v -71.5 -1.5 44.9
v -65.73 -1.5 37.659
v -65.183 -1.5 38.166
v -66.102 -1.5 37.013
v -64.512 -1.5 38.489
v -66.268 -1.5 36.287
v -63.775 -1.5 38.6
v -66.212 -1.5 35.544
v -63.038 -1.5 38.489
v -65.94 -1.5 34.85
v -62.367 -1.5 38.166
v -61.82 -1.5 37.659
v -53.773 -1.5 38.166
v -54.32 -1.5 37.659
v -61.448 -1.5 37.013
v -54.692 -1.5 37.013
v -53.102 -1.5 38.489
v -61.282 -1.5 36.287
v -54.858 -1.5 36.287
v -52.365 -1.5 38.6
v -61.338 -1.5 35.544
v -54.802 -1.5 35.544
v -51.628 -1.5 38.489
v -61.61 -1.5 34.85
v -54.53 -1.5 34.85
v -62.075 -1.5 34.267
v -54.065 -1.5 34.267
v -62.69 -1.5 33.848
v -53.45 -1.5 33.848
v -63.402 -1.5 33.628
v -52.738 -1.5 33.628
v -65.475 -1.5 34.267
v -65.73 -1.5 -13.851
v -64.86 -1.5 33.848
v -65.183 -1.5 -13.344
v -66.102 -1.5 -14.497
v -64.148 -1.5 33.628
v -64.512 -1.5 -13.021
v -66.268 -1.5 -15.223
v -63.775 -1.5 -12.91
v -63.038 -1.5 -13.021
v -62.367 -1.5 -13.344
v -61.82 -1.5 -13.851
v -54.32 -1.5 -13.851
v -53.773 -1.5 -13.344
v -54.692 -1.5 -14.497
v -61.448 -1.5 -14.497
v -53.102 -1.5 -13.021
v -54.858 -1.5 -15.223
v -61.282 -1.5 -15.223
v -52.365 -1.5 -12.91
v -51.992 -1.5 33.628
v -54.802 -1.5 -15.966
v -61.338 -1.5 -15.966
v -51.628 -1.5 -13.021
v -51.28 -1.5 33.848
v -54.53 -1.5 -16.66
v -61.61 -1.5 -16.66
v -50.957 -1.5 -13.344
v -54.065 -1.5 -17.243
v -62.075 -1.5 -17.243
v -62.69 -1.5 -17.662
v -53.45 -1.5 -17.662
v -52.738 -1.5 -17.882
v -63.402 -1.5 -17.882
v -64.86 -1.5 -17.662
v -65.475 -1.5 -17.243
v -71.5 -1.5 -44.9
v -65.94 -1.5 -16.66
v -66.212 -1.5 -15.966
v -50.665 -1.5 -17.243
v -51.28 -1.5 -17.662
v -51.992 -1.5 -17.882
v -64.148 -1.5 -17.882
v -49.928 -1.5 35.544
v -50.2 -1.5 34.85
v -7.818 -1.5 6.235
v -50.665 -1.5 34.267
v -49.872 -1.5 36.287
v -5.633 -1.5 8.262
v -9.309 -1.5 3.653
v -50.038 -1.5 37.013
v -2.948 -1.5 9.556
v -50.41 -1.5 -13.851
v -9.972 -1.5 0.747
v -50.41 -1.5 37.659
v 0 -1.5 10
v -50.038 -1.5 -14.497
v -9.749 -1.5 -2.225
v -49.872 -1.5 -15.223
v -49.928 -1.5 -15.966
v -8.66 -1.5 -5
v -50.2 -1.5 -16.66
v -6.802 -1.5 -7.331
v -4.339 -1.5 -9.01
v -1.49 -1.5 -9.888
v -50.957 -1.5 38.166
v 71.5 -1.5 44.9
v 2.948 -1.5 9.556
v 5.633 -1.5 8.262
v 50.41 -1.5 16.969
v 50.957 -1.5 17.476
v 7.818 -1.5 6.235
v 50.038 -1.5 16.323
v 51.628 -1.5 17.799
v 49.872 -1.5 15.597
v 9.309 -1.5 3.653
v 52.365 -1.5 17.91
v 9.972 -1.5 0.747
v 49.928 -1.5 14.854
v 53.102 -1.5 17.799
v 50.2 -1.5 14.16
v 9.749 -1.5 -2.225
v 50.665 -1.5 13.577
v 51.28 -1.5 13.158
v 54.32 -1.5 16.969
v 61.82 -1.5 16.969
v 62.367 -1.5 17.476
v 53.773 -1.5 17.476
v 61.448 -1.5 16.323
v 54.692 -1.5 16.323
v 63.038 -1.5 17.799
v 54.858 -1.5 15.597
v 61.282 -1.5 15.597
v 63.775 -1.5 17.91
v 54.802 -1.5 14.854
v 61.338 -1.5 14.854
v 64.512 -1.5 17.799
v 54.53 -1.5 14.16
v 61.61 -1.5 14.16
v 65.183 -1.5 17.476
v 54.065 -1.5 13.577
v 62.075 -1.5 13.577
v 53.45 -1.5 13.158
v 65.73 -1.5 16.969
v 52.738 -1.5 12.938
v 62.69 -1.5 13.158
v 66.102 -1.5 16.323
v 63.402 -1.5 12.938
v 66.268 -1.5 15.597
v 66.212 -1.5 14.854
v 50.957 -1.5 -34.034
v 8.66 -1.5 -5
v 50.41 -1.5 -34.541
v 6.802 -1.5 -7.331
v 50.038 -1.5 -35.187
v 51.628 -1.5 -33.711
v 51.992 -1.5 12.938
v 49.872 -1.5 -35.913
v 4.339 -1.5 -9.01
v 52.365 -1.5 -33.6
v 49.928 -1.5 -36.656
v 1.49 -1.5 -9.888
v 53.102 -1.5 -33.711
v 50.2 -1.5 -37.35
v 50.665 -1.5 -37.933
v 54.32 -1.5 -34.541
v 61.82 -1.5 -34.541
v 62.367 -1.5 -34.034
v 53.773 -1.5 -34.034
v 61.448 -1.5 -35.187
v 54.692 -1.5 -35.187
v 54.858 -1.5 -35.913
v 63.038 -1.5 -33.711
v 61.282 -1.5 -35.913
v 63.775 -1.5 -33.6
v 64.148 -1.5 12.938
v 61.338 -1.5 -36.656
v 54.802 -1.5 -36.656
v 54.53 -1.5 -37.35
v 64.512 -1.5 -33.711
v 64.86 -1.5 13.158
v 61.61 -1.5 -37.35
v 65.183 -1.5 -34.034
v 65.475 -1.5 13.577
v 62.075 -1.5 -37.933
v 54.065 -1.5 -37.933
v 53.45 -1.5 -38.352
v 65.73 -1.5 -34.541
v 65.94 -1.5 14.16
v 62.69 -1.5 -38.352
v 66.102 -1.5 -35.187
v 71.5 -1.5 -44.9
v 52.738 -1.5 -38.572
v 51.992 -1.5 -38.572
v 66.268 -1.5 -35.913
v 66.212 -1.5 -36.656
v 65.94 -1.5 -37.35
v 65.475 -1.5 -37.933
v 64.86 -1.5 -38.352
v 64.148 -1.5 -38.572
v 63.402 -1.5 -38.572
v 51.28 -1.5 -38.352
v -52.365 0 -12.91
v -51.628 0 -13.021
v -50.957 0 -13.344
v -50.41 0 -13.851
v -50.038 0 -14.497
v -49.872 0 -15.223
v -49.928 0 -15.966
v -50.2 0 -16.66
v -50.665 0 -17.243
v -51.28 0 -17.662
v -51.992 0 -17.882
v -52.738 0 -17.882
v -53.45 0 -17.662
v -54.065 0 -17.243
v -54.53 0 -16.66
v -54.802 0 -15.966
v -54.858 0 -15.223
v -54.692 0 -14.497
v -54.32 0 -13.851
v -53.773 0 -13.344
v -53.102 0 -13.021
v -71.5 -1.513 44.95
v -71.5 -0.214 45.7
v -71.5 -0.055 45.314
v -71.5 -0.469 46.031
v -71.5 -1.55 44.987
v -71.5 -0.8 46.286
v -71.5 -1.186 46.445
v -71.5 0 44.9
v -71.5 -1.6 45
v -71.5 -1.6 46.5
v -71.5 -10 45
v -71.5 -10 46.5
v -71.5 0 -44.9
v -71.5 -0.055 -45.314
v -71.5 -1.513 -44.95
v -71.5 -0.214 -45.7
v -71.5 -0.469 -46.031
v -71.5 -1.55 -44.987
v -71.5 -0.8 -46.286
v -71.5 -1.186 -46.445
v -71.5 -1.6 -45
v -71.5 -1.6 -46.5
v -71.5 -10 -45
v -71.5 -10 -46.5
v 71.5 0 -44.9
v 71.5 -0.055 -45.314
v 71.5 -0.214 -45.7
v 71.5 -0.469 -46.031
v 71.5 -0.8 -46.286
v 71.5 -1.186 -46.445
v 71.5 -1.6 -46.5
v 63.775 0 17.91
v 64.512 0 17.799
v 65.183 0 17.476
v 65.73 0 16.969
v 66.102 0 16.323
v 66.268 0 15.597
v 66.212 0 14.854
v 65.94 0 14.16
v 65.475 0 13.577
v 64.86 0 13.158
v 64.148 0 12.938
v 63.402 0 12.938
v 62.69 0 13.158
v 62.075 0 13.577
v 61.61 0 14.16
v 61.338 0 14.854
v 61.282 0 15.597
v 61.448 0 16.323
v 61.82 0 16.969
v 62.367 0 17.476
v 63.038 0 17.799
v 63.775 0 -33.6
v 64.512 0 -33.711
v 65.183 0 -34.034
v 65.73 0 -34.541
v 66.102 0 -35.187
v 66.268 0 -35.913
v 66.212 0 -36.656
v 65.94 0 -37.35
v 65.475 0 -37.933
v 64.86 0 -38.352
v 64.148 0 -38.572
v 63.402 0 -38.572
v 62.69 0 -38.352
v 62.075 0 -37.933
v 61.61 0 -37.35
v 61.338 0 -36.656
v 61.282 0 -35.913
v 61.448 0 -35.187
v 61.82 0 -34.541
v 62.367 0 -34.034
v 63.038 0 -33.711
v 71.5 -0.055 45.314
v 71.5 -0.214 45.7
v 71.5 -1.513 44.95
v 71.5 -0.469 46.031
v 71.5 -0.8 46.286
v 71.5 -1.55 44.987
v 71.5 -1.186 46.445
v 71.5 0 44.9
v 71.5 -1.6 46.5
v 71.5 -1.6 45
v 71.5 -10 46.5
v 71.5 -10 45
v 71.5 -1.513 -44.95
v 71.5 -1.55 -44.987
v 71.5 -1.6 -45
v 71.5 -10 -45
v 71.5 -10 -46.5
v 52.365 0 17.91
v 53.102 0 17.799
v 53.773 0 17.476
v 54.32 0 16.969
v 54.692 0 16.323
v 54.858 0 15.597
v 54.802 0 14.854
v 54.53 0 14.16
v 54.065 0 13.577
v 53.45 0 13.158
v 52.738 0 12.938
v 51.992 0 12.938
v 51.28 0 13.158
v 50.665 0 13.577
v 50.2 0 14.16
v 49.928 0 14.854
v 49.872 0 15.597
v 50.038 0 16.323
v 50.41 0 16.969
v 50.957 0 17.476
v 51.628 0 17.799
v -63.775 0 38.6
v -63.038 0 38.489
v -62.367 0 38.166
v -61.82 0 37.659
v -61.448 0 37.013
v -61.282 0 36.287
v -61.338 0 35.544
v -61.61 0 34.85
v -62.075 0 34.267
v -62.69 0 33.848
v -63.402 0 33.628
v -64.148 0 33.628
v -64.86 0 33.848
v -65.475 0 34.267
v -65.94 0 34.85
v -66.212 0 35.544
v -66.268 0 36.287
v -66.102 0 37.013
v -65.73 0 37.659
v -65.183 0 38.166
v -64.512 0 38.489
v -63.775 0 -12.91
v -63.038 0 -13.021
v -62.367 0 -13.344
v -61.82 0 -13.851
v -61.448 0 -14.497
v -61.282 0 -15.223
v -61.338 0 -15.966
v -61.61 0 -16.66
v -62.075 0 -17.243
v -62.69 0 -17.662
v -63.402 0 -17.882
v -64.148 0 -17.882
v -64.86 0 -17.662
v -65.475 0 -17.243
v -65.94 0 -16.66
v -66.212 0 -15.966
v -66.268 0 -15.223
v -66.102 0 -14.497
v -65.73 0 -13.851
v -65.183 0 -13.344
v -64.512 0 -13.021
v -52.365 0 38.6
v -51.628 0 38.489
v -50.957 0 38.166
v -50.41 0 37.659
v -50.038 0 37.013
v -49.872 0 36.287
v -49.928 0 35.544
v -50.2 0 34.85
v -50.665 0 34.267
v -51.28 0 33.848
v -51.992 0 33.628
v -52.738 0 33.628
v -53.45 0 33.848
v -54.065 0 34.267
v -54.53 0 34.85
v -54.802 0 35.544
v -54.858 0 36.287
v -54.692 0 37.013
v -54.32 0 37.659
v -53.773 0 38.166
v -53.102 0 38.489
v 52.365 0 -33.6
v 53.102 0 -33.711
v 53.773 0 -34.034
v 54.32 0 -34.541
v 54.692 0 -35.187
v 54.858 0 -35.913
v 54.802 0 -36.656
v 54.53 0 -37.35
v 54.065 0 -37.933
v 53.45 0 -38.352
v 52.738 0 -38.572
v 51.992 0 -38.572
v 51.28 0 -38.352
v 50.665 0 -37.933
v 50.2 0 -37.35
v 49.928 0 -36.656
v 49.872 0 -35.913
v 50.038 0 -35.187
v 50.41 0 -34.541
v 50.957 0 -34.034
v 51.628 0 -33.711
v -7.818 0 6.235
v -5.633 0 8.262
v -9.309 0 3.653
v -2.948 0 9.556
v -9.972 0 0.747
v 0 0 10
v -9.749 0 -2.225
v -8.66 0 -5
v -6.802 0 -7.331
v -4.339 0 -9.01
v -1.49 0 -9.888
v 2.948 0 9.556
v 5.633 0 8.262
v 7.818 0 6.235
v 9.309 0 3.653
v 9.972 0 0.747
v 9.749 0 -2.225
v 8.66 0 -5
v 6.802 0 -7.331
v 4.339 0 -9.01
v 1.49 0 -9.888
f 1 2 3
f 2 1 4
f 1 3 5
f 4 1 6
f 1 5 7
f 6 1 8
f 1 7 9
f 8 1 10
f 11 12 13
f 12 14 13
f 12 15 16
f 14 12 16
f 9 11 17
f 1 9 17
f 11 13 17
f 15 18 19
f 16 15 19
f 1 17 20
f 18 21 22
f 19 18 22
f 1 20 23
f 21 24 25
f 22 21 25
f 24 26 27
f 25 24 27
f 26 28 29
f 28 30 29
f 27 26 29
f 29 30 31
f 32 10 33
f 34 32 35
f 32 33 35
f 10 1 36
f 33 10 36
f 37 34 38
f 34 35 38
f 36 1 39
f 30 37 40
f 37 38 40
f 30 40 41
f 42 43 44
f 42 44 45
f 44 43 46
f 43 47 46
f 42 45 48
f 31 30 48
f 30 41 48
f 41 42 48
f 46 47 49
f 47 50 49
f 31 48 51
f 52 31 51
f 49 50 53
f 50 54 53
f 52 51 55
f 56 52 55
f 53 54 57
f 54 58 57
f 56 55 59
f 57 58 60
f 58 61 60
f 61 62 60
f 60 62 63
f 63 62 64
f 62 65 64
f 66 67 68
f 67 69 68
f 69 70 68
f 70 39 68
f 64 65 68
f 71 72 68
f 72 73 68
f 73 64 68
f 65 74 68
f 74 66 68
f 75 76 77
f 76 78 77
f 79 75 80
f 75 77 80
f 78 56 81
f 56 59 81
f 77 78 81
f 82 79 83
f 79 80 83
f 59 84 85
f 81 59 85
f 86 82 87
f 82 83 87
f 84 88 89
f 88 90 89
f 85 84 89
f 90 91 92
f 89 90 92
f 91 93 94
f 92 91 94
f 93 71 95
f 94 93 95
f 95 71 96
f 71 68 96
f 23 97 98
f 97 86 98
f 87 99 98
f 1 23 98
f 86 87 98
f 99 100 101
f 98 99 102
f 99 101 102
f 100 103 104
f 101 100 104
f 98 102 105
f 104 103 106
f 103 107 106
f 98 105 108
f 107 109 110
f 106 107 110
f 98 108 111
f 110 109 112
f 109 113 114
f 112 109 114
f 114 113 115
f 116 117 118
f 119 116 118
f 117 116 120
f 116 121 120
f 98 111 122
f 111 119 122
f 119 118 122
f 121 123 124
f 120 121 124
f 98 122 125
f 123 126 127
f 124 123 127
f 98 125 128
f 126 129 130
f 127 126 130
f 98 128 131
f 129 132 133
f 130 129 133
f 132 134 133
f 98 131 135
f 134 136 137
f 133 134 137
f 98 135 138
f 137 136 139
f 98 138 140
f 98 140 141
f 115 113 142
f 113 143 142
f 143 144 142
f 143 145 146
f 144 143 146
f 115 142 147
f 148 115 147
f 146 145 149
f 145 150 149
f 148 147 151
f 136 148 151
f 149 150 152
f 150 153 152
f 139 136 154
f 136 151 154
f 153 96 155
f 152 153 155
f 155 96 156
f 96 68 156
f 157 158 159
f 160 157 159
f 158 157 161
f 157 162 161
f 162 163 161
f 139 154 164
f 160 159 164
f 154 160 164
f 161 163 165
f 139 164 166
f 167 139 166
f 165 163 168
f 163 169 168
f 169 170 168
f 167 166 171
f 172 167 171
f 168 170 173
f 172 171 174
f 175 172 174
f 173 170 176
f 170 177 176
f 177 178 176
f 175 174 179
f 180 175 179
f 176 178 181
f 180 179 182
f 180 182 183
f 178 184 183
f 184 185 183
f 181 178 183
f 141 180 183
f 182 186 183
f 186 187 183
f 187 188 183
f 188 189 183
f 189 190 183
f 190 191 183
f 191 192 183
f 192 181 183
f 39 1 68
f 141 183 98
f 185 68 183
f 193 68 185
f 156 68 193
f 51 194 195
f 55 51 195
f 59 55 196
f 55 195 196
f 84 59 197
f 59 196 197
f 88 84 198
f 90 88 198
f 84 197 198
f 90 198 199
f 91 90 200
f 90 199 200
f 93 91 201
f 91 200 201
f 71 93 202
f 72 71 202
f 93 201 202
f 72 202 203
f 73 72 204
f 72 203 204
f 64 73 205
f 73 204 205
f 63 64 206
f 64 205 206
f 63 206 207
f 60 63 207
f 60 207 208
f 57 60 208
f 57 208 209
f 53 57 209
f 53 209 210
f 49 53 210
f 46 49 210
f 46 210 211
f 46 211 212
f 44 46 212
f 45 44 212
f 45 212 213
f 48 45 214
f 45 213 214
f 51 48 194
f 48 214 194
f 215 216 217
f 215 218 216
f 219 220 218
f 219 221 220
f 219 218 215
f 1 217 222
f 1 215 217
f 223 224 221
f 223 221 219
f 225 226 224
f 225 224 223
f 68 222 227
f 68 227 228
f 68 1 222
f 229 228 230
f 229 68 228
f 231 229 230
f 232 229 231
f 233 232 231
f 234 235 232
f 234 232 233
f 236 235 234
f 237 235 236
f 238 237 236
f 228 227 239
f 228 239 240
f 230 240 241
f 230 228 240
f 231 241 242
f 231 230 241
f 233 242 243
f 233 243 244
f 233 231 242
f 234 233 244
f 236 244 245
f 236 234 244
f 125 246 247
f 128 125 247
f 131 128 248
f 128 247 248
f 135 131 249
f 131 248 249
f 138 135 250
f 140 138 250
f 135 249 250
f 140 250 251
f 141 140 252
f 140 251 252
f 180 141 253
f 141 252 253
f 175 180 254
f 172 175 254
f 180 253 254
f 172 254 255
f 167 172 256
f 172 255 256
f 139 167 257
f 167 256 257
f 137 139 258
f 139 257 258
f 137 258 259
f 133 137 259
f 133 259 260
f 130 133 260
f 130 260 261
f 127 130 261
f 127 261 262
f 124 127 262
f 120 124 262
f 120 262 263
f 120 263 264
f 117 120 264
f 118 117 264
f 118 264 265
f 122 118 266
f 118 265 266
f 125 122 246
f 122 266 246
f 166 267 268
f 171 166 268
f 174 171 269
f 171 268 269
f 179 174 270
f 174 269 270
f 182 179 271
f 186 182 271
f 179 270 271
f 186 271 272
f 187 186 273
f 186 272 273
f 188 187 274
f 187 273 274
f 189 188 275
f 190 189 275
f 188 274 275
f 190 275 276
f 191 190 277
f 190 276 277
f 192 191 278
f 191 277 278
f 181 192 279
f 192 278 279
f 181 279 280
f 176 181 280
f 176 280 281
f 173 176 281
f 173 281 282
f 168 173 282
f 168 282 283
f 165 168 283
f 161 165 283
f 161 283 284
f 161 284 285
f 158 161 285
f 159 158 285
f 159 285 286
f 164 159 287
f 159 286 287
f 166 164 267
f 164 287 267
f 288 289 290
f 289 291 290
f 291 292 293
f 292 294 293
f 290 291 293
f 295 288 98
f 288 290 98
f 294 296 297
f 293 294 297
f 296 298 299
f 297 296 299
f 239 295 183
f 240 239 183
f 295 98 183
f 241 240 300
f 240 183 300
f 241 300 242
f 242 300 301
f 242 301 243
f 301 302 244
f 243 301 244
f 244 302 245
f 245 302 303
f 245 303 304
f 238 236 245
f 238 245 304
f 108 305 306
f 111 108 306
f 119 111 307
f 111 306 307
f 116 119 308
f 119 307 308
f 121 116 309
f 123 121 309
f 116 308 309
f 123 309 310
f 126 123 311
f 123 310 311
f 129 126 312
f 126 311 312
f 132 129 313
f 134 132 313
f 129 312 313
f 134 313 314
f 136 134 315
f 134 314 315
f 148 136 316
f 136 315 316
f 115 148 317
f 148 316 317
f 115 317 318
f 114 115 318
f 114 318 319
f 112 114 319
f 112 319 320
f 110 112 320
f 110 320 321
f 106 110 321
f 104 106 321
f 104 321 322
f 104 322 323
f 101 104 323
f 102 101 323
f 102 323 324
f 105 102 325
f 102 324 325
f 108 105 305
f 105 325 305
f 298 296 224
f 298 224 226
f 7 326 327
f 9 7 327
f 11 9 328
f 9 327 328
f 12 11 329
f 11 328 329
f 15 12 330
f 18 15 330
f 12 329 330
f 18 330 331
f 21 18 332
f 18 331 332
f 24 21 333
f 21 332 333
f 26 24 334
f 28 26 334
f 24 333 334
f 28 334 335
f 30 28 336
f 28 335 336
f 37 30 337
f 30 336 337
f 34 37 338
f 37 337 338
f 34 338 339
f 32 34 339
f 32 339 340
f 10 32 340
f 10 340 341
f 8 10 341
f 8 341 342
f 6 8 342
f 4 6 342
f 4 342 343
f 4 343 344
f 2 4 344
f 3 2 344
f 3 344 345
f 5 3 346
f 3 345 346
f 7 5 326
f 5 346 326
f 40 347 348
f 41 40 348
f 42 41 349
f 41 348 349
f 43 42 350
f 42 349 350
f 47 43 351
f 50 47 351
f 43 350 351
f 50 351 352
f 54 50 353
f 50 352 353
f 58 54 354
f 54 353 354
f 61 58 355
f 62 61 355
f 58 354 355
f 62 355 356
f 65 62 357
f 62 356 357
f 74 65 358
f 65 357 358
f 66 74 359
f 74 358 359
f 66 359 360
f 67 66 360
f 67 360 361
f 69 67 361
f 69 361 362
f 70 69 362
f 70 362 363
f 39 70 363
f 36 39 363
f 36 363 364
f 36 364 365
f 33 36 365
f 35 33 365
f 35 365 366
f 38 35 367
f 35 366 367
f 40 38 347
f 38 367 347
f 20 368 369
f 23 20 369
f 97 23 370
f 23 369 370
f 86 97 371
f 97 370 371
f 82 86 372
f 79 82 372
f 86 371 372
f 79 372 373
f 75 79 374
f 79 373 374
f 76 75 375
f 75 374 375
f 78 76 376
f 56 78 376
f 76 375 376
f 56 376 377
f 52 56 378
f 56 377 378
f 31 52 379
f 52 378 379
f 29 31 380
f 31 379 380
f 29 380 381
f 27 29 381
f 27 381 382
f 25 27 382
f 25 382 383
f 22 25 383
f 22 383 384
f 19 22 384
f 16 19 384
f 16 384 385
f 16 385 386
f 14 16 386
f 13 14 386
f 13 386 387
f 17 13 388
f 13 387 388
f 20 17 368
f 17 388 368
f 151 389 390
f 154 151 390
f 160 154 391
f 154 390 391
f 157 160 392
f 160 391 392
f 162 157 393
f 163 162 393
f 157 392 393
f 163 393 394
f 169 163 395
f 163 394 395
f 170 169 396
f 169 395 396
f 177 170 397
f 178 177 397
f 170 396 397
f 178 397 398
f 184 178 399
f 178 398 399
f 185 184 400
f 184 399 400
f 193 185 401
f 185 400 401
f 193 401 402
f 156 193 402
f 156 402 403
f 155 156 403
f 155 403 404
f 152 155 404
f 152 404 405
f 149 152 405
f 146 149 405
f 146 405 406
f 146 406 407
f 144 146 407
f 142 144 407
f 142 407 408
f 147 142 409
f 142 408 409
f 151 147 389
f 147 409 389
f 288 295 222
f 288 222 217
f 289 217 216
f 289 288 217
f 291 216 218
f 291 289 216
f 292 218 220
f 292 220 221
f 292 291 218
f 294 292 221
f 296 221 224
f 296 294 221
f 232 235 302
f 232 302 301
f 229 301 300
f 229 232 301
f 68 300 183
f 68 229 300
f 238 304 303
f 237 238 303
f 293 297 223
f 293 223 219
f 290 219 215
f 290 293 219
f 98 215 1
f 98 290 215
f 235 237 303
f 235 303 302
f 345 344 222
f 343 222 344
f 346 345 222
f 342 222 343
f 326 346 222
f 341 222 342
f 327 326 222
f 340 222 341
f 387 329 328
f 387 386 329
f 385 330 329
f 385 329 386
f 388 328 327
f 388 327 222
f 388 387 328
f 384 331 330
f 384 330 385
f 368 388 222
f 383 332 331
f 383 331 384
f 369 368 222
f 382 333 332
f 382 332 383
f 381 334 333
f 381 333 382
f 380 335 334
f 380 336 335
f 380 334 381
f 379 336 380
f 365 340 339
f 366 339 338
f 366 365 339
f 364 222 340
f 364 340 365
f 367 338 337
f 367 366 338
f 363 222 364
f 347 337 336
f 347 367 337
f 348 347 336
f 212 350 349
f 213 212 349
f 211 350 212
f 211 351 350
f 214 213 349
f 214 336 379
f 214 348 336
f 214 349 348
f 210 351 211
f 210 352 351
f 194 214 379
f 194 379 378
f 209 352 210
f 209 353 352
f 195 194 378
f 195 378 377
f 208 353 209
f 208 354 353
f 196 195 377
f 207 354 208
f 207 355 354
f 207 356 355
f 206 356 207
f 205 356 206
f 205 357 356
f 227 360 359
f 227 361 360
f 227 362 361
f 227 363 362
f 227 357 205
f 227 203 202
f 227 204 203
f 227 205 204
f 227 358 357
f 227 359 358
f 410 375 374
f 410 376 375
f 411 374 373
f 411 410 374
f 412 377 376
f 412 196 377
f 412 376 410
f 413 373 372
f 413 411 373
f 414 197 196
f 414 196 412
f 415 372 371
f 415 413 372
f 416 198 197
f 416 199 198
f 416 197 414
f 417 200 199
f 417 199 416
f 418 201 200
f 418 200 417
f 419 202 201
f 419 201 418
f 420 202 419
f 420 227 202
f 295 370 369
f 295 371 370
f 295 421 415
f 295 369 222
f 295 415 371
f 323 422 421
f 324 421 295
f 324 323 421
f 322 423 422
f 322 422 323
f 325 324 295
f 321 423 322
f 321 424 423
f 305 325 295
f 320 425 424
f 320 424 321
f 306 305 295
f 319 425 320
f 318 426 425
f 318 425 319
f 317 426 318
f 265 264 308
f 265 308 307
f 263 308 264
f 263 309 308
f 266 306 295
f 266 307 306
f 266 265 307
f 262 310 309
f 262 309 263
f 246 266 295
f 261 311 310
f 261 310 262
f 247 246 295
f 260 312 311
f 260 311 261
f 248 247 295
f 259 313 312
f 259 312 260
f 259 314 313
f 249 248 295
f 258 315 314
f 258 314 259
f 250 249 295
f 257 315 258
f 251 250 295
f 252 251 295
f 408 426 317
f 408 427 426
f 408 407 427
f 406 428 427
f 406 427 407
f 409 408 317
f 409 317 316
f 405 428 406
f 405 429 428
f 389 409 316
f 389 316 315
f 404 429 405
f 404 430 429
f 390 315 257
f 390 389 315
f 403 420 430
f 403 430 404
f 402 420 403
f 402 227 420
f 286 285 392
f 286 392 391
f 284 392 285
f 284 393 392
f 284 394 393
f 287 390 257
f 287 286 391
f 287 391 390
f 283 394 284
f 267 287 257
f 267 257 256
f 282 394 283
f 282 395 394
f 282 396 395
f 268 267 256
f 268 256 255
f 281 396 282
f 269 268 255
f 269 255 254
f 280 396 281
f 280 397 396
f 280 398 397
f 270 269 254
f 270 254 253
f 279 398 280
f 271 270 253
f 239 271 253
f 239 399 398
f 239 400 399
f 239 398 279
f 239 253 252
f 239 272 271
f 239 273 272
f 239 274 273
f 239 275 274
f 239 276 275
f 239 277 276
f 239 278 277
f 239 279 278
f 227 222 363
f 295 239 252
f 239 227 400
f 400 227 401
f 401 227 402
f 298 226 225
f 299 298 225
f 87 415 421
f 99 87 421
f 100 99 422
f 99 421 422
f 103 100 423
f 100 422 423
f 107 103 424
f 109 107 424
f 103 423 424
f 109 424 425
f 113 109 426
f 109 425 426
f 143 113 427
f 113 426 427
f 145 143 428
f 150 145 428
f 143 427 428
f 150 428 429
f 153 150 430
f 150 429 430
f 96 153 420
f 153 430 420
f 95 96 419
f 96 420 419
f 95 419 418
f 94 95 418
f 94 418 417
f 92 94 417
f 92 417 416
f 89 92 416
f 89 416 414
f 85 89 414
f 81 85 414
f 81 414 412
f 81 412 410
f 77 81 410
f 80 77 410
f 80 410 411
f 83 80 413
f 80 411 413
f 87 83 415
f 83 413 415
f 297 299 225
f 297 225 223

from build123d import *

# Parameters (mm, degrees)
SKETCH2_W                      = 143
SKETCH2_H                      = 93
BASE_FLANGE1_DEPTH             = 1.5
EDGE_FLANGE1_STRIP_W           = 6.2
EDGE_FLANGE1_STRIP_H           = 1.5
EDGE_FLANGE1_STRIP_CUT_DEPTH   = 143
EDGE_FLANGE1_STRIP_2_W         = 6.2
EDGE_FLANGE1_STRIP_2_H         = 1.5
EDGE_FLANGE1_STRIP_CUT_2_DEPTH = 143
EDGE_FLANGE1_DEPTH             = 143
EDGE_FLANGE1_BEND_DEPTH        = 143
SKETCH13_R                     = 10
CUT_EXTRUDE1_DEPTH             = 1.5
SKETCH14_R                     = 2.5
CUT_EXTRUDE2_DEPTH             = 1.5


# Sheet-metal steps are written as plain solids
with BuildPart() as part:
    # Sketch2 → Base-Flange1 (new body)
    with BuildSketch(Plane(origin=(0, 0, 0), x_dir=(1, 0, 0), z_dir=(0, 1, 0))):
        Rectangle(SKETCH2_W, SKETCH2_H)
    extrude(amount=-BASE_FLANGE1_DEPTH)

    # Edge-Flange1 strip (across the edge) → Edge-Flange1 strip cut (cut)
    with BuildSketch(Plane(origin=(71.5, -1.5, 46.5), x_dir=(0, 0, -1), z_dir=(-1, 0, 0))):
        with Locations((-1.5, -0.75)):
            Rectangle(EDGE_FLANGE1_STRIP_W, EDGE_FLANGE1_STRIP_H)
    extrude(amount=EDGE_FLANGE1_STRIP_CUT_DEPTH, mode=Mode.SUBTRACT)

    # Edge-Flange1 strip 2 (across the edge) → Edge-Flange1 strip cut 2 (cut)
    with BuildSketch(Plane(origin=(-71.5, -1.5, -46.5), x_dir=(0, 0, 1), z_dir=(1, 0, 0))):
        with Locations((-1.5, -0.75)):
            Rectangle(EDGE_FLANGE1_STRIP_2_W, EDGE_FLANGE1_STRIP_2_H)
    extrude(amount=EDGE_FLANGE1_STRIP_CUT_2_DEPTH, mode=Mode.SUBTRACT)

    # Edge-Flange1 section (across the edge) → Edge-Flange1 (add)
    with BuildSketch(Plane(origin=(71.5, -1.5, 46.5), x_dir=(0, 0, -1), z_dir=(-1, 0, 0))):
        with BuildLine():
            Line((0, 0.1), (0, 8.5))
            Line((0, 8.5), (1.5, 8.5))
            Line((1.5, 8.5), (1.5, 0.1))
            ThreePointArc((1.5, 0.1), (1.529289322, 0.029289322), (1.6, 0))
            Line((1.6, 0), (1.6, -1.5))
            ThreePointArc((1.6, -1.5), (0.46862915, -1.03137085), (0, 0.1))
        make_face()
    extrude(amount=EDGE_FLANGE1_DEPTH)

    # Edge-Flange1 section 2 (across the edge) → Edge-Flange1 bend (add)
    with BuildSketch(Plane(origin=(-71.5, -1.5, -46.5), x_dir=(0, 0, 1), z_dir=(1, 0, 0))):
        with BuildLine():
            Line((0, 0.1), (0, 8.5))
            Line((0, 8.5), (1.5, 8.5))
            Line((1.5, 8.5), (1.5, 0.1))
            ThreePointArc((1.5, 0.1), (1.529289322, 0.029289322), (1.6, 0))
            Line((1.6, 0), (1.6, -1.5))
            ThreePointArc((1.6, -1.5), (0.46862915, -1.03137085), (0, 0.1))
        make_face()
    extrude(amount=EDGE_FLANGE1_BEND_DEPTH)

    # Sketch13 → Cut-Extrude1 (cut)
    with BuildSketch(Plane(origin=(0, 0, 0), x_dir=(1, 0, 0), z_dir=(0, 1, 0))):
        with Locations(Location((0, 0, 0), (0, 0, 270))):
            Circle(SKETCH13_R)
    extrude(amount=-CUT_EXTRUDE1_DEPTH, mode=Mode.SUBTRACT)

    # Sketch14 → Cut-Extrude2 (cut)
    with BuildSketch(Plane(origin=(0, 0, 0), x_dir=(1, 0, 0), z_dir=(0, 1, 0))):
        with Locations(Location((63.775, 36.1, 0), (0, 0, 270))):
            Circle(SKETCH14_R)
        with Locations(Location((52.365, 36.1, 0), (0, 0, 270))):
            Circle(SKETCH14_R)
        with Locations(Location((52.365, -15.41, 0), (0, 0, 270))):
            Circle(SKETCH14_R)
        with Locations(Location((63.775, -15.41, 0), (0, 0, 270))):
            Circle(SKETCH14_R)
        with Locations(Location((-63.775, -36.1, 0), (0, 0, 270))):
            Circle(SKETCH14_R)
        with Locations(Location((-52.365, -36.1, 0), (0, 0, 270))):
            Circle(SKETCH14_R)
        with Locations(Location((-52.365, 15.41, 0), (0, 0, 270))):
            Circle(SKETCH14_R)
        with Locations(Location((-63.775, 15.41, 0), (0, 0, 270))):
            Circle(SKETCH14_R)
    extrude(amount=-CUT_EXTRUDE2_DEPTH, mode=Mode.SUBTRACT)


solid = part.part
